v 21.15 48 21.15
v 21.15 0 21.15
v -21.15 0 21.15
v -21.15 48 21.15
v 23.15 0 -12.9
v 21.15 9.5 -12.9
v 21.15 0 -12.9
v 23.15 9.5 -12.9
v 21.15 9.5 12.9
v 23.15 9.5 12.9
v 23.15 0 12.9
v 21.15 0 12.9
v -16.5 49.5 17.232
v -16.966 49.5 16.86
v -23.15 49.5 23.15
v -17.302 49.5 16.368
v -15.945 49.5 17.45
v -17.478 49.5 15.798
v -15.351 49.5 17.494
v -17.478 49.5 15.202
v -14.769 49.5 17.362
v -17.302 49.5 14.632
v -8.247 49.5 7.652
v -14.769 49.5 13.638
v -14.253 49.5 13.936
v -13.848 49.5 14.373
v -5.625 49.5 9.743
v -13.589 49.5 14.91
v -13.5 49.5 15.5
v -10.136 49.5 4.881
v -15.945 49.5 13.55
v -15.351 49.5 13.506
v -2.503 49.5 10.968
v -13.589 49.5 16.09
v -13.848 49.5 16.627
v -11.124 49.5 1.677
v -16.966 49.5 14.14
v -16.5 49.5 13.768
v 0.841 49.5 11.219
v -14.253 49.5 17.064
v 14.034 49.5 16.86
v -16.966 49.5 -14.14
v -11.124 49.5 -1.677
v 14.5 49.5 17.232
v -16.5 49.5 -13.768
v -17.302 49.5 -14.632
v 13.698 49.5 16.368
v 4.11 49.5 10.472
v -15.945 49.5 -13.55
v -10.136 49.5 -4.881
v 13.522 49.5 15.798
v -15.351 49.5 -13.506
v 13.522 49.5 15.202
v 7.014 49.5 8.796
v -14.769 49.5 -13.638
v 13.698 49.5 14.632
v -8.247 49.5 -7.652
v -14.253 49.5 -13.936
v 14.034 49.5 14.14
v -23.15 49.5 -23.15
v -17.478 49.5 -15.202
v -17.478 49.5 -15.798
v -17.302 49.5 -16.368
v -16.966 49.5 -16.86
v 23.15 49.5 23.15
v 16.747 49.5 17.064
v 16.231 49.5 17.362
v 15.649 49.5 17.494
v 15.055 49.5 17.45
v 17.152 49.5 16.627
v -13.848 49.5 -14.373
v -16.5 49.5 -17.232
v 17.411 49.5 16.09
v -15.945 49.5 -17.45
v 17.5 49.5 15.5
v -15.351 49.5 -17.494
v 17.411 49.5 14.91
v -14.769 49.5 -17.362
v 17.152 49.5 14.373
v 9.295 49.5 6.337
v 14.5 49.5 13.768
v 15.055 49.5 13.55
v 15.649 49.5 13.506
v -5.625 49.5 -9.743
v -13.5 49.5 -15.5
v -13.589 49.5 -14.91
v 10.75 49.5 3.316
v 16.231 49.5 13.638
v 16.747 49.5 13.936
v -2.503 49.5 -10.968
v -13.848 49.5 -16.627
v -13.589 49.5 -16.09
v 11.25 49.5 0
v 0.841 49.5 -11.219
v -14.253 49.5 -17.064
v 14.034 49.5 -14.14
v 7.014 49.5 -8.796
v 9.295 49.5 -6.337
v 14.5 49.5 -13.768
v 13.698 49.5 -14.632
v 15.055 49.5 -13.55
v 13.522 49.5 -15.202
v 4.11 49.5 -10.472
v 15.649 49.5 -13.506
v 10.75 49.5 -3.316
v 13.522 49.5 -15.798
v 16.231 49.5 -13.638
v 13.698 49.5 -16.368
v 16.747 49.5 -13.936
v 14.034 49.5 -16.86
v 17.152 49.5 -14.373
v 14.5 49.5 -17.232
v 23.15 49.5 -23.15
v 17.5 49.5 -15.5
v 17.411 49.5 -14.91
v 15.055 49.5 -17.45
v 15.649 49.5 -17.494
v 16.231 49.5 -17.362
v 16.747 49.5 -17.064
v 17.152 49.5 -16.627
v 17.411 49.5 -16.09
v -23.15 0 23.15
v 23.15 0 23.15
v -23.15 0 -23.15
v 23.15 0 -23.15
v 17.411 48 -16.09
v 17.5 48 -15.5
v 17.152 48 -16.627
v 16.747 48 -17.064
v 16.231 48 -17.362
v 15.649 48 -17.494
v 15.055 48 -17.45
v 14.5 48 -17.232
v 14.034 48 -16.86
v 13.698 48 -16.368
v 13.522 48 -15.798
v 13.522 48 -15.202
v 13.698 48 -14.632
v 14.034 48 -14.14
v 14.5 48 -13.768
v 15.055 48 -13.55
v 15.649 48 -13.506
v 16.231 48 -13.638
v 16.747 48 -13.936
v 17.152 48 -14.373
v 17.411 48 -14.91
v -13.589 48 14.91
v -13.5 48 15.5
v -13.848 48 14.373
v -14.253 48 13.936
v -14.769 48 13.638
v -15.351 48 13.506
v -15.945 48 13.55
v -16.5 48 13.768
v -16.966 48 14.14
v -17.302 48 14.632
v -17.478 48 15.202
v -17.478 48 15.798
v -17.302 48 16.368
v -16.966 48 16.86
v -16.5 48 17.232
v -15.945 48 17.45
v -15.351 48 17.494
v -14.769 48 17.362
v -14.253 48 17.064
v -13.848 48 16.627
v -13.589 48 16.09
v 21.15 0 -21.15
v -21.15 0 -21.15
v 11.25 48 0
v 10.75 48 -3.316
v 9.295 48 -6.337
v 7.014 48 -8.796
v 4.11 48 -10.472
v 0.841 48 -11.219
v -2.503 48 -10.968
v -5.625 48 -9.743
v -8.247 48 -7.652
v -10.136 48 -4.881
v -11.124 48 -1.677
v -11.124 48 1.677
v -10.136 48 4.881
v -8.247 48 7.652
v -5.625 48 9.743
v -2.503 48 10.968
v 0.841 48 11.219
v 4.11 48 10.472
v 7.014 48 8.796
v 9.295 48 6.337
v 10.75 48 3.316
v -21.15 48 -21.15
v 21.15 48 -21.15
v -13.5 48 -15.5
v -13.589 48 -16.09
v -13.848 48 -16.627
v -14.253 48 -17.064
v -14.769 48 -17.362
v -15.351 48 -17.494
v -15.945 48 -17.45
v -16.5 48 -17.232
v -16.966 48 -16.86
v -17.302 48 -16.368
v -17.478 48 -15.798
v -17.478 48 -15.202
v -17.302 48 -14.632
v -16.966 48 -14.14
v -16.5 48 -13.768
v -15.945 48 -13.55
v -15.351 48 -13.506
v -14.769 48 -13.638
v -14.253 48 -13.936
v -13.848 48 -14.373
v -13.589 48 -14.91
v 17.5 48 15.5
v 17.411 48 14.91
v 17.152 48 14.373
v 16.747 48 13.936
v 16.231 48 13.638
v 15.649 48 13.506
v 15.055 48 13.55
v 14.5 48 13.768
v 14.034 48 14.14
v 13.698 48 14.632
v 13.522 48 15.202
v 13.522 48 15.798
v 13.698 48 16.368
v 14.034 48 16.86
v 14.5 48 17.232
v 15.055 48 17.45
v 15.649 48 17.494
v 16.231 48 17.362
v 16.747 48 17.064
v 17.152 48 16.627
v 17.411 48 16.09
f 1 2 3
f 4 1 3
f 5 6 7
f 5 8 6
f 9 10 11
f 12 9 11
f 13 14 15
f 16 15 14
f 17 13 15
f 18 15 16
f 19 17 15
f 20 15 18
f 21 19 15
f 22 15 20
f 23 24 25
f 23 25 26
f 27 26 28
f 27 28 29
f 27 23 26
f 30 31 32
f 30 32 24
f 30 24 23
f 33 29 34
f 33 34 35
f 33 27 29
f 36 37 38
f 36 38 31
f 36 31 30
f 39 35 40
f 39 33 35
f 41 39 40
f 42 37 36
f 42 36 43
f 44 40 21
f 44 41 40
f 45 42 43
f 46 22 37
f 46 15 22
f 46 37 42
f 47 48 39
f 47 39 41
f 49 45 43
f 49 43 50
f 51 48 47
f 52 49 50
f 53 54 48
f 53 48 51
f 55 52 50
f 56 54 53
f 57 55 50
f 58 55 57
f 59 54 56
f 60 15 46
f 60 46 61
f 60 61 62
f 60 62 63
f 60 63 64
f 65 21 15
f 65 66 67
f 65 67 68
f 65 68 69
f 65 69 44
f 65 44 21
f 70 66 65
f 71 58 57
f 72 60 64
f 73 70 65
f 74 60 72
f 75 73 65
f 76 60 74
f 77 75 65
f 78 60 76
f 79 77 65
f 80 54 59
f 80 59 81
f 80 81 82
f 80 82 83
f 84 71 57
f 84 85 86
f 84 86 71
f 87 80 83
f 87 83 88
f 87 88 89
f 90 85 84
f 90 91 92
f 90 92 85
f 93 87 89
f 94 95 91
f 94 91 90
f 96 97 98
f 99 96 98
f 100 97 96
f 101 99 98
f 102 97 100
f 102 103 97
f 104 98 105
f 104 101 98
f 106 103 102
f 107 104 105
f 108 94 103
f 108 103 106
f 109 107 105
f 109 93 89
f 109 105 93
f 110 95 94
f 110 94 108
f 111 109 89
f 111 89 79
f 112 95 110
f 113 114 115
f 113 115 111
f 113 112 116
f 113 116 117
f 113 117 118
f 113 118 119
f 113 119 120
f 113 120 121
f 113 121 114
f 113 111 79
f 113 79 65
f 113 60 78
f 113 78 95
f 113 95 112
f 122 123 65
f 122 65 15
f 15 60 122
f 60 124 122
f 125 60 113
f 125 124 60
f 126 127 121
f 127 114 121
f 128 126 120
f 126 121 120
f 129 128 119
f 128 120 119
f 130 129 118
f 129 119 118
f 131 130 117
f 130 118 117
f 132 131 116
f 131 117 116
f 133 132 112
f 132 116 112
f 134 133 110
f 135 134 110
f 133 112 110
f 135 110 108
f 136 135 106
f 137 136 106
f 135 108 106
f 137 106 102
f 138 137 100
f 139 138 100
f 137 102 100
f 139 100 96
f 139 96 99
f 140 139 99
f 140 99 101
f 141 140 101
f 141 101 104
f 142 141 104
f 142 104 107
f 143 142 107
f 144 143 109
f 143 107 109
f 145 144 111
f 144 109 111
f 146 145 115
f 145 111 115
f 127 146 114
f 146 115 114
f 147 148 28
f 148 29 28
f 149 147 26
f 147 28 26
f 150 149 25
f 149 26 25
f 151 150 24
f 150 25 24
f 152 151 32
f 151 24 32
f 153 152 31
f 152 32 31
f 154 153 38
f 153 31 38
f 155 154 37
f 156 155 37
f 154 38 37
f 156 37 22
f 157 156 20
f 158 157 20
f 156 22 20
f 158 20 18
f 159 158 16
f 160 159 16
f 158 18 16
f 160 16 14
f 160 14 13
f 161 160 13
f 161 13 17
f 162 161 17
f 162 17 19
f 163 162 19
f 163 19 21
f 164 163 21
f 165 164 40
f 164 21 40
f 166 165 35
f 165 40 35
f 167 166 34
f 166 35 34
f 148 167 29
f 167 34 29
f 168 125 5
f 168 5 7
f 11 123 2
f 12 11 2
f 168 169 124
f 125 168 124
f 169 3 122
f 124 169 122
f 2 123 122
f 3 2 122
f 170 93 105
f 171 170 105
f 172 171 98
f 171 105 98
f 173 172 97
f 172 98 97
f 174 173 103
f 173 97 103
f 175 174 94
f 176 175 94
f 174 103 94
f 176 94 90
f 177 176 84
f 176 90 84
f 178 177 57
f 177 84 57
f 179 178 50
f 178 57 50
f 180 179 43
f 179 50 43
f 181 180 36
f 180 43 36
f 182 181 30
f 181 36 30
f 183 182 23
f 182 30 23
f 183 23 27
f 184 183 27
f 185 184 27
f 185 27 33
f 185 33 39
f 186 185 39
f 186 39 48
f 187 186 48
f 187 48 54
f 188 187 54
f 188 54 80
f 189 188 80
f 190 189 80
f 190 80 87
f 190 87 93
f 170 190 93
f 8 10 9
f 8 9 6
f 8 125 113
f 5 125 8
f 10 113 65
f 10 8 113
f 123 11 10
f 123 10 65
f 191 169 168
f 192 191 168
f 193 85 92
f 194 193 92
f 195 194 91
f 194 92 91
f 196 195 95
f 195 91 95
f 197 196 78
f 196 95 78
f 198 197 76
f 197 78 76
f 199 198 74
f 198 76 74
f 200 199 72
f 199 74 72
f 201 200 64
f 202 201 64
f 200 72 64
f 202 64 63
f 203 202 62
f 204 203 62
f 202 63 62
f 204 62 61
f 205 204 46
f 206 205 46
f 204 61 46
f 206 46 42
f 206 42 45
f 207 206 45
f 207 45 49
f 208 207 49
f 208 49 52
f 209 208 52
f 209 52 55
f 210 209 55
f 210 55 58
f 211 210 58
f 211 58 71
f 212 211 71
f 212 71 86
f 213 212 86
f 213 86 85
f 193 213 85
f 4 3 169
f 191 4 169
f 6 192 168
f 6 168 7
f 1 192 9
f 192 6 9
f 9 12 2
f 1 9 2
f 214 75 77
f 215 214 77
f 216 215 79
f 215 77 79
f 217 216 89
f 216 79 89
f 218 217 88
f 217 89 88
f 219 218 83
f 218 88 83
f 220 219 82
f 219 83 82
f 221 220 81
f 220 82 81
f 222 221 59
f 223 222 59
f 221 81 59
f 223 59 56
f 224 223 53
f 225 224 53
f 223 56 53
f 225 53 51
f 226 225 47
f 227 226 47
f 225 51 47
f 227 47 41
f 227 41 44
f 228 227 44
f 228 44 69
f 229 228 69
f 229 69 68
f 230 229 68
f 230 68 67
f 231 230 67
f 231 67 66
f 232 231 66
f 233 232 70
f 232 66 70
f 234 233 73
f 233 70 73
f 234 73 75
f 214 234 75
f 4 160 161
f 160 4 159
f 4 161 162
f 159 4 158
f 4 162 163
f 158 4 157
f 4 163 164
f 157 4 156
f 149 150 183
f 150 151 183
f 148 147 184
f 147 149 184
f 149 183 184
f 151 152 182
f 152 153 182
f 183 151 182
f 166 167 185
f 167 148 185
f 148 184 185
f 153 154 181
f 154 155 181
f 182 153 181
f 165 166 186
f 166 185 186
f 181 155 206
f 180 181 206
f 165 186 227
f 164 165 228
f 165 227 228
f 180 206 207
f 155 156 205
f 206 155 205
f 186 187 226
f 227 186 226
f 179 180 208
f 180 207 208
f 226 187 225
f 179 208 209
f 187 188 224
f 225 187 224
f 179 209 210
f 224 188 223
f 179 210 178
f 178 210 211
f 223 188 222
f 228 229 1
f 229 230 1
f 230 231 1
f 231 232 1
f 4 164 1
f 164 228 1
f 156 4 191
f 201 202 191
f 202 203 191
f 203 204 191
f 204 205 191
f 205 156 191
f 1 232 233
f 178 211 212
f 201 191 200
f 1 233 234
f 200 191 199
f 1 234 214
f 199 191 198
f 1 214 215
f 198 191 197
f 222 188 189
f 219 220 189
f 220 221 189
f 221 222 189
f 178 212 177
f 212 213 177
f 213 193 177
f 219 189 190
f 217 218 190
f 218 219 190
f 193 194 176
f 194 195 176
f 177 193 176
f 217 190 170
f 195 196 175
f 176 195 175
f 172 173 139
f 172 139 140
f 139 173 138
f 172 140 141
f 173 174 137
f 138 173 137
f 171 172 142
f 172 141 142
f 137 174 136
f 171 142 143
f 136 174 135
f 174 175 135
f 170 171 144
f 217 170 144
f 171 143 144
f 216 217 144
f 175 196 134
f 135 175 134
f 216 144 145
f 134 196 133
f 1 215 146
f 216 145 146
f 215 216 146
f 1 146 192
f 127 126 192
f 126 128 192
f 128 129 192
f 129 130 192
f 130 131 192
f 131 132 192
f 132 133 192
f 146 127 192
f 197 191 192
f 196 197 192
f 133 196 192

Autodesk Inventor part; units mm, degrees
ref_plane "YZ Plane" through (0, 0, 0) normal (1, 0, 0) x (0, 1, 0)
ref_plane "XZ Plane" through (0, 0, 0) normal (0, 1, 0) x (-1, 0, 0)
ref_plane "XY Plane" through (0, 0, 0) normal (0, 0, 1) x (1, 0, 0)
sketch "Эскиз1" plane through (0, 0, 0) normal (0, 1, 0) x (-1, 0, 0)
  line L0 (-21.15, 21.15) -> (21.15, 21.15)
  line L1 (21.15, 21.15) -> (21.15, -21.15)
  line L2 (21.15, -21.15) -> (-21.15, -21.15)
  line L3 (-21.15, -21.15) -> (-21.15, 21.15)
  line L4 (-21.15, 21.15) -> (21.15, -21.15) construction
  line L5 (21.15, 21.15) -> (-21.15, -21.15) construction
  line L6 (-23.15, 23.15) -> (23.15, 23.15)
  line L7 (23.15, 23.15) -> (23.15, -23.15)
  line L8 (23.15, -23.15) -> (-23.15, -23.15)
  line L9 (-23.15, -23.15) -> (-23.15, 23.15)
  line L10 (-23.15, 23.15) -> (23.15, -23.15) construction
  line L11 (23.15, 23.15) -> (-23.15, -23.15) construction
  point P0 (0, 0)
  dimension "d0" = 42.3
  dimension "d1" = 42.3
  dimension "d2" = 46.3
  dimension "d3" = 46.3
extrude "Выдавливание1" add sketch "Эскиз1" along normal blind 48
sketch "Эскиз2" plane through (23.15, 0, 23.15) normal (1, 0, 0) x (0, 0, -1)
  line L0 (23.15, 9.5) -> (36.05, 9.5)
  line L1 (36.05, 9.5) -> (10.25, 9.5)
  line L2 (10.25, 9.5) -> (10.25, 0)
  line L3 (44.3, 0) -> (2, 0) projected
  line L4 (36.05, 9.5) -> (36.05, 0)
  point P0 (23.15, 0)
  dimension "d6" = 9.5
  dimension "d7" = 12.9
  dimension "d8" = 25.8
extrude "Выдавливание2" cut sketch "Эскиз2" against normal blind 2
sketch "Эскиз3" plane through (0, 48, 0) normal (0, 1, 0) x (1, 0, 0)
  line L0 (-23.15, 23.15) -> (-23.15, -23.15) projected
  line L1 (23.15, -23.15) -> (-23.15, -23.15)
  line L2 (-23.15, -23.15) -> (-23.15, 23.15)
  line L3 (-23.15, 23.15) -> (23.15, 23.15)
  line L4 (23.15, 23.15) -> (23.15, -23.15)
  line L5 (23.15, -23.15) -> (-23.15, 23.15) construction
  line L6 (-23.15, -23.15) -> (23.15, 23.15) construction
  point P0 (0, 0)
extrude "Выдавливание3" add sketch "Эскиз3" along normal blind 1.5
sketch "Эскиз4" plane through (0, 49.5, 0) normal (0, 1, 0) x (1, 0, 0)
  circle A0 centre (0, 0) radius 11.25
  line L0 (15.5, 15.5) -> (-15.5, 15.5)
  line L1 (-15.5, 15.5) -> (-15.5, -15.5)
  line L2 (-15.5, -15.5) -> (15.5, -15.5)
  line L3 (15.5, -15.5) -> (15.5, 15.5)
  line L4 (15.5, 15.5) -> (-15.5, -15.5) construction
  line L5 (-15.5, 15.5) -> (15.5, -15.5) construction
  circle A1 centre (-15.5, -15.5) radius 2
  circle A2 centre (-15.5, 15.5) radius 2
  circle A3 centre (15.5, 15.5) radius 2
  circle A4 centre (15.5, -15.5) radius 2
  dimension "d13" = 22.5
  dimension "d14" = 31
  dimension "d15" = 31
  dimension "d16" = 4
  dimension "d17" = 4
  dimension "d18" = 4
  dimension "d19" = 4
extrude "Выдавливание4" cut sketch "Эскиз4" against normal blind 1.5 contours A0 | A2 L1 L0 | L0 L1 A2 | A3 L3 L0 | L0 L3 A3 | A1 L2 L1 | L1 L2 A1 | A4 L2 L3 | L3 L2 A4
properties part number "Корпус для двигателя"
